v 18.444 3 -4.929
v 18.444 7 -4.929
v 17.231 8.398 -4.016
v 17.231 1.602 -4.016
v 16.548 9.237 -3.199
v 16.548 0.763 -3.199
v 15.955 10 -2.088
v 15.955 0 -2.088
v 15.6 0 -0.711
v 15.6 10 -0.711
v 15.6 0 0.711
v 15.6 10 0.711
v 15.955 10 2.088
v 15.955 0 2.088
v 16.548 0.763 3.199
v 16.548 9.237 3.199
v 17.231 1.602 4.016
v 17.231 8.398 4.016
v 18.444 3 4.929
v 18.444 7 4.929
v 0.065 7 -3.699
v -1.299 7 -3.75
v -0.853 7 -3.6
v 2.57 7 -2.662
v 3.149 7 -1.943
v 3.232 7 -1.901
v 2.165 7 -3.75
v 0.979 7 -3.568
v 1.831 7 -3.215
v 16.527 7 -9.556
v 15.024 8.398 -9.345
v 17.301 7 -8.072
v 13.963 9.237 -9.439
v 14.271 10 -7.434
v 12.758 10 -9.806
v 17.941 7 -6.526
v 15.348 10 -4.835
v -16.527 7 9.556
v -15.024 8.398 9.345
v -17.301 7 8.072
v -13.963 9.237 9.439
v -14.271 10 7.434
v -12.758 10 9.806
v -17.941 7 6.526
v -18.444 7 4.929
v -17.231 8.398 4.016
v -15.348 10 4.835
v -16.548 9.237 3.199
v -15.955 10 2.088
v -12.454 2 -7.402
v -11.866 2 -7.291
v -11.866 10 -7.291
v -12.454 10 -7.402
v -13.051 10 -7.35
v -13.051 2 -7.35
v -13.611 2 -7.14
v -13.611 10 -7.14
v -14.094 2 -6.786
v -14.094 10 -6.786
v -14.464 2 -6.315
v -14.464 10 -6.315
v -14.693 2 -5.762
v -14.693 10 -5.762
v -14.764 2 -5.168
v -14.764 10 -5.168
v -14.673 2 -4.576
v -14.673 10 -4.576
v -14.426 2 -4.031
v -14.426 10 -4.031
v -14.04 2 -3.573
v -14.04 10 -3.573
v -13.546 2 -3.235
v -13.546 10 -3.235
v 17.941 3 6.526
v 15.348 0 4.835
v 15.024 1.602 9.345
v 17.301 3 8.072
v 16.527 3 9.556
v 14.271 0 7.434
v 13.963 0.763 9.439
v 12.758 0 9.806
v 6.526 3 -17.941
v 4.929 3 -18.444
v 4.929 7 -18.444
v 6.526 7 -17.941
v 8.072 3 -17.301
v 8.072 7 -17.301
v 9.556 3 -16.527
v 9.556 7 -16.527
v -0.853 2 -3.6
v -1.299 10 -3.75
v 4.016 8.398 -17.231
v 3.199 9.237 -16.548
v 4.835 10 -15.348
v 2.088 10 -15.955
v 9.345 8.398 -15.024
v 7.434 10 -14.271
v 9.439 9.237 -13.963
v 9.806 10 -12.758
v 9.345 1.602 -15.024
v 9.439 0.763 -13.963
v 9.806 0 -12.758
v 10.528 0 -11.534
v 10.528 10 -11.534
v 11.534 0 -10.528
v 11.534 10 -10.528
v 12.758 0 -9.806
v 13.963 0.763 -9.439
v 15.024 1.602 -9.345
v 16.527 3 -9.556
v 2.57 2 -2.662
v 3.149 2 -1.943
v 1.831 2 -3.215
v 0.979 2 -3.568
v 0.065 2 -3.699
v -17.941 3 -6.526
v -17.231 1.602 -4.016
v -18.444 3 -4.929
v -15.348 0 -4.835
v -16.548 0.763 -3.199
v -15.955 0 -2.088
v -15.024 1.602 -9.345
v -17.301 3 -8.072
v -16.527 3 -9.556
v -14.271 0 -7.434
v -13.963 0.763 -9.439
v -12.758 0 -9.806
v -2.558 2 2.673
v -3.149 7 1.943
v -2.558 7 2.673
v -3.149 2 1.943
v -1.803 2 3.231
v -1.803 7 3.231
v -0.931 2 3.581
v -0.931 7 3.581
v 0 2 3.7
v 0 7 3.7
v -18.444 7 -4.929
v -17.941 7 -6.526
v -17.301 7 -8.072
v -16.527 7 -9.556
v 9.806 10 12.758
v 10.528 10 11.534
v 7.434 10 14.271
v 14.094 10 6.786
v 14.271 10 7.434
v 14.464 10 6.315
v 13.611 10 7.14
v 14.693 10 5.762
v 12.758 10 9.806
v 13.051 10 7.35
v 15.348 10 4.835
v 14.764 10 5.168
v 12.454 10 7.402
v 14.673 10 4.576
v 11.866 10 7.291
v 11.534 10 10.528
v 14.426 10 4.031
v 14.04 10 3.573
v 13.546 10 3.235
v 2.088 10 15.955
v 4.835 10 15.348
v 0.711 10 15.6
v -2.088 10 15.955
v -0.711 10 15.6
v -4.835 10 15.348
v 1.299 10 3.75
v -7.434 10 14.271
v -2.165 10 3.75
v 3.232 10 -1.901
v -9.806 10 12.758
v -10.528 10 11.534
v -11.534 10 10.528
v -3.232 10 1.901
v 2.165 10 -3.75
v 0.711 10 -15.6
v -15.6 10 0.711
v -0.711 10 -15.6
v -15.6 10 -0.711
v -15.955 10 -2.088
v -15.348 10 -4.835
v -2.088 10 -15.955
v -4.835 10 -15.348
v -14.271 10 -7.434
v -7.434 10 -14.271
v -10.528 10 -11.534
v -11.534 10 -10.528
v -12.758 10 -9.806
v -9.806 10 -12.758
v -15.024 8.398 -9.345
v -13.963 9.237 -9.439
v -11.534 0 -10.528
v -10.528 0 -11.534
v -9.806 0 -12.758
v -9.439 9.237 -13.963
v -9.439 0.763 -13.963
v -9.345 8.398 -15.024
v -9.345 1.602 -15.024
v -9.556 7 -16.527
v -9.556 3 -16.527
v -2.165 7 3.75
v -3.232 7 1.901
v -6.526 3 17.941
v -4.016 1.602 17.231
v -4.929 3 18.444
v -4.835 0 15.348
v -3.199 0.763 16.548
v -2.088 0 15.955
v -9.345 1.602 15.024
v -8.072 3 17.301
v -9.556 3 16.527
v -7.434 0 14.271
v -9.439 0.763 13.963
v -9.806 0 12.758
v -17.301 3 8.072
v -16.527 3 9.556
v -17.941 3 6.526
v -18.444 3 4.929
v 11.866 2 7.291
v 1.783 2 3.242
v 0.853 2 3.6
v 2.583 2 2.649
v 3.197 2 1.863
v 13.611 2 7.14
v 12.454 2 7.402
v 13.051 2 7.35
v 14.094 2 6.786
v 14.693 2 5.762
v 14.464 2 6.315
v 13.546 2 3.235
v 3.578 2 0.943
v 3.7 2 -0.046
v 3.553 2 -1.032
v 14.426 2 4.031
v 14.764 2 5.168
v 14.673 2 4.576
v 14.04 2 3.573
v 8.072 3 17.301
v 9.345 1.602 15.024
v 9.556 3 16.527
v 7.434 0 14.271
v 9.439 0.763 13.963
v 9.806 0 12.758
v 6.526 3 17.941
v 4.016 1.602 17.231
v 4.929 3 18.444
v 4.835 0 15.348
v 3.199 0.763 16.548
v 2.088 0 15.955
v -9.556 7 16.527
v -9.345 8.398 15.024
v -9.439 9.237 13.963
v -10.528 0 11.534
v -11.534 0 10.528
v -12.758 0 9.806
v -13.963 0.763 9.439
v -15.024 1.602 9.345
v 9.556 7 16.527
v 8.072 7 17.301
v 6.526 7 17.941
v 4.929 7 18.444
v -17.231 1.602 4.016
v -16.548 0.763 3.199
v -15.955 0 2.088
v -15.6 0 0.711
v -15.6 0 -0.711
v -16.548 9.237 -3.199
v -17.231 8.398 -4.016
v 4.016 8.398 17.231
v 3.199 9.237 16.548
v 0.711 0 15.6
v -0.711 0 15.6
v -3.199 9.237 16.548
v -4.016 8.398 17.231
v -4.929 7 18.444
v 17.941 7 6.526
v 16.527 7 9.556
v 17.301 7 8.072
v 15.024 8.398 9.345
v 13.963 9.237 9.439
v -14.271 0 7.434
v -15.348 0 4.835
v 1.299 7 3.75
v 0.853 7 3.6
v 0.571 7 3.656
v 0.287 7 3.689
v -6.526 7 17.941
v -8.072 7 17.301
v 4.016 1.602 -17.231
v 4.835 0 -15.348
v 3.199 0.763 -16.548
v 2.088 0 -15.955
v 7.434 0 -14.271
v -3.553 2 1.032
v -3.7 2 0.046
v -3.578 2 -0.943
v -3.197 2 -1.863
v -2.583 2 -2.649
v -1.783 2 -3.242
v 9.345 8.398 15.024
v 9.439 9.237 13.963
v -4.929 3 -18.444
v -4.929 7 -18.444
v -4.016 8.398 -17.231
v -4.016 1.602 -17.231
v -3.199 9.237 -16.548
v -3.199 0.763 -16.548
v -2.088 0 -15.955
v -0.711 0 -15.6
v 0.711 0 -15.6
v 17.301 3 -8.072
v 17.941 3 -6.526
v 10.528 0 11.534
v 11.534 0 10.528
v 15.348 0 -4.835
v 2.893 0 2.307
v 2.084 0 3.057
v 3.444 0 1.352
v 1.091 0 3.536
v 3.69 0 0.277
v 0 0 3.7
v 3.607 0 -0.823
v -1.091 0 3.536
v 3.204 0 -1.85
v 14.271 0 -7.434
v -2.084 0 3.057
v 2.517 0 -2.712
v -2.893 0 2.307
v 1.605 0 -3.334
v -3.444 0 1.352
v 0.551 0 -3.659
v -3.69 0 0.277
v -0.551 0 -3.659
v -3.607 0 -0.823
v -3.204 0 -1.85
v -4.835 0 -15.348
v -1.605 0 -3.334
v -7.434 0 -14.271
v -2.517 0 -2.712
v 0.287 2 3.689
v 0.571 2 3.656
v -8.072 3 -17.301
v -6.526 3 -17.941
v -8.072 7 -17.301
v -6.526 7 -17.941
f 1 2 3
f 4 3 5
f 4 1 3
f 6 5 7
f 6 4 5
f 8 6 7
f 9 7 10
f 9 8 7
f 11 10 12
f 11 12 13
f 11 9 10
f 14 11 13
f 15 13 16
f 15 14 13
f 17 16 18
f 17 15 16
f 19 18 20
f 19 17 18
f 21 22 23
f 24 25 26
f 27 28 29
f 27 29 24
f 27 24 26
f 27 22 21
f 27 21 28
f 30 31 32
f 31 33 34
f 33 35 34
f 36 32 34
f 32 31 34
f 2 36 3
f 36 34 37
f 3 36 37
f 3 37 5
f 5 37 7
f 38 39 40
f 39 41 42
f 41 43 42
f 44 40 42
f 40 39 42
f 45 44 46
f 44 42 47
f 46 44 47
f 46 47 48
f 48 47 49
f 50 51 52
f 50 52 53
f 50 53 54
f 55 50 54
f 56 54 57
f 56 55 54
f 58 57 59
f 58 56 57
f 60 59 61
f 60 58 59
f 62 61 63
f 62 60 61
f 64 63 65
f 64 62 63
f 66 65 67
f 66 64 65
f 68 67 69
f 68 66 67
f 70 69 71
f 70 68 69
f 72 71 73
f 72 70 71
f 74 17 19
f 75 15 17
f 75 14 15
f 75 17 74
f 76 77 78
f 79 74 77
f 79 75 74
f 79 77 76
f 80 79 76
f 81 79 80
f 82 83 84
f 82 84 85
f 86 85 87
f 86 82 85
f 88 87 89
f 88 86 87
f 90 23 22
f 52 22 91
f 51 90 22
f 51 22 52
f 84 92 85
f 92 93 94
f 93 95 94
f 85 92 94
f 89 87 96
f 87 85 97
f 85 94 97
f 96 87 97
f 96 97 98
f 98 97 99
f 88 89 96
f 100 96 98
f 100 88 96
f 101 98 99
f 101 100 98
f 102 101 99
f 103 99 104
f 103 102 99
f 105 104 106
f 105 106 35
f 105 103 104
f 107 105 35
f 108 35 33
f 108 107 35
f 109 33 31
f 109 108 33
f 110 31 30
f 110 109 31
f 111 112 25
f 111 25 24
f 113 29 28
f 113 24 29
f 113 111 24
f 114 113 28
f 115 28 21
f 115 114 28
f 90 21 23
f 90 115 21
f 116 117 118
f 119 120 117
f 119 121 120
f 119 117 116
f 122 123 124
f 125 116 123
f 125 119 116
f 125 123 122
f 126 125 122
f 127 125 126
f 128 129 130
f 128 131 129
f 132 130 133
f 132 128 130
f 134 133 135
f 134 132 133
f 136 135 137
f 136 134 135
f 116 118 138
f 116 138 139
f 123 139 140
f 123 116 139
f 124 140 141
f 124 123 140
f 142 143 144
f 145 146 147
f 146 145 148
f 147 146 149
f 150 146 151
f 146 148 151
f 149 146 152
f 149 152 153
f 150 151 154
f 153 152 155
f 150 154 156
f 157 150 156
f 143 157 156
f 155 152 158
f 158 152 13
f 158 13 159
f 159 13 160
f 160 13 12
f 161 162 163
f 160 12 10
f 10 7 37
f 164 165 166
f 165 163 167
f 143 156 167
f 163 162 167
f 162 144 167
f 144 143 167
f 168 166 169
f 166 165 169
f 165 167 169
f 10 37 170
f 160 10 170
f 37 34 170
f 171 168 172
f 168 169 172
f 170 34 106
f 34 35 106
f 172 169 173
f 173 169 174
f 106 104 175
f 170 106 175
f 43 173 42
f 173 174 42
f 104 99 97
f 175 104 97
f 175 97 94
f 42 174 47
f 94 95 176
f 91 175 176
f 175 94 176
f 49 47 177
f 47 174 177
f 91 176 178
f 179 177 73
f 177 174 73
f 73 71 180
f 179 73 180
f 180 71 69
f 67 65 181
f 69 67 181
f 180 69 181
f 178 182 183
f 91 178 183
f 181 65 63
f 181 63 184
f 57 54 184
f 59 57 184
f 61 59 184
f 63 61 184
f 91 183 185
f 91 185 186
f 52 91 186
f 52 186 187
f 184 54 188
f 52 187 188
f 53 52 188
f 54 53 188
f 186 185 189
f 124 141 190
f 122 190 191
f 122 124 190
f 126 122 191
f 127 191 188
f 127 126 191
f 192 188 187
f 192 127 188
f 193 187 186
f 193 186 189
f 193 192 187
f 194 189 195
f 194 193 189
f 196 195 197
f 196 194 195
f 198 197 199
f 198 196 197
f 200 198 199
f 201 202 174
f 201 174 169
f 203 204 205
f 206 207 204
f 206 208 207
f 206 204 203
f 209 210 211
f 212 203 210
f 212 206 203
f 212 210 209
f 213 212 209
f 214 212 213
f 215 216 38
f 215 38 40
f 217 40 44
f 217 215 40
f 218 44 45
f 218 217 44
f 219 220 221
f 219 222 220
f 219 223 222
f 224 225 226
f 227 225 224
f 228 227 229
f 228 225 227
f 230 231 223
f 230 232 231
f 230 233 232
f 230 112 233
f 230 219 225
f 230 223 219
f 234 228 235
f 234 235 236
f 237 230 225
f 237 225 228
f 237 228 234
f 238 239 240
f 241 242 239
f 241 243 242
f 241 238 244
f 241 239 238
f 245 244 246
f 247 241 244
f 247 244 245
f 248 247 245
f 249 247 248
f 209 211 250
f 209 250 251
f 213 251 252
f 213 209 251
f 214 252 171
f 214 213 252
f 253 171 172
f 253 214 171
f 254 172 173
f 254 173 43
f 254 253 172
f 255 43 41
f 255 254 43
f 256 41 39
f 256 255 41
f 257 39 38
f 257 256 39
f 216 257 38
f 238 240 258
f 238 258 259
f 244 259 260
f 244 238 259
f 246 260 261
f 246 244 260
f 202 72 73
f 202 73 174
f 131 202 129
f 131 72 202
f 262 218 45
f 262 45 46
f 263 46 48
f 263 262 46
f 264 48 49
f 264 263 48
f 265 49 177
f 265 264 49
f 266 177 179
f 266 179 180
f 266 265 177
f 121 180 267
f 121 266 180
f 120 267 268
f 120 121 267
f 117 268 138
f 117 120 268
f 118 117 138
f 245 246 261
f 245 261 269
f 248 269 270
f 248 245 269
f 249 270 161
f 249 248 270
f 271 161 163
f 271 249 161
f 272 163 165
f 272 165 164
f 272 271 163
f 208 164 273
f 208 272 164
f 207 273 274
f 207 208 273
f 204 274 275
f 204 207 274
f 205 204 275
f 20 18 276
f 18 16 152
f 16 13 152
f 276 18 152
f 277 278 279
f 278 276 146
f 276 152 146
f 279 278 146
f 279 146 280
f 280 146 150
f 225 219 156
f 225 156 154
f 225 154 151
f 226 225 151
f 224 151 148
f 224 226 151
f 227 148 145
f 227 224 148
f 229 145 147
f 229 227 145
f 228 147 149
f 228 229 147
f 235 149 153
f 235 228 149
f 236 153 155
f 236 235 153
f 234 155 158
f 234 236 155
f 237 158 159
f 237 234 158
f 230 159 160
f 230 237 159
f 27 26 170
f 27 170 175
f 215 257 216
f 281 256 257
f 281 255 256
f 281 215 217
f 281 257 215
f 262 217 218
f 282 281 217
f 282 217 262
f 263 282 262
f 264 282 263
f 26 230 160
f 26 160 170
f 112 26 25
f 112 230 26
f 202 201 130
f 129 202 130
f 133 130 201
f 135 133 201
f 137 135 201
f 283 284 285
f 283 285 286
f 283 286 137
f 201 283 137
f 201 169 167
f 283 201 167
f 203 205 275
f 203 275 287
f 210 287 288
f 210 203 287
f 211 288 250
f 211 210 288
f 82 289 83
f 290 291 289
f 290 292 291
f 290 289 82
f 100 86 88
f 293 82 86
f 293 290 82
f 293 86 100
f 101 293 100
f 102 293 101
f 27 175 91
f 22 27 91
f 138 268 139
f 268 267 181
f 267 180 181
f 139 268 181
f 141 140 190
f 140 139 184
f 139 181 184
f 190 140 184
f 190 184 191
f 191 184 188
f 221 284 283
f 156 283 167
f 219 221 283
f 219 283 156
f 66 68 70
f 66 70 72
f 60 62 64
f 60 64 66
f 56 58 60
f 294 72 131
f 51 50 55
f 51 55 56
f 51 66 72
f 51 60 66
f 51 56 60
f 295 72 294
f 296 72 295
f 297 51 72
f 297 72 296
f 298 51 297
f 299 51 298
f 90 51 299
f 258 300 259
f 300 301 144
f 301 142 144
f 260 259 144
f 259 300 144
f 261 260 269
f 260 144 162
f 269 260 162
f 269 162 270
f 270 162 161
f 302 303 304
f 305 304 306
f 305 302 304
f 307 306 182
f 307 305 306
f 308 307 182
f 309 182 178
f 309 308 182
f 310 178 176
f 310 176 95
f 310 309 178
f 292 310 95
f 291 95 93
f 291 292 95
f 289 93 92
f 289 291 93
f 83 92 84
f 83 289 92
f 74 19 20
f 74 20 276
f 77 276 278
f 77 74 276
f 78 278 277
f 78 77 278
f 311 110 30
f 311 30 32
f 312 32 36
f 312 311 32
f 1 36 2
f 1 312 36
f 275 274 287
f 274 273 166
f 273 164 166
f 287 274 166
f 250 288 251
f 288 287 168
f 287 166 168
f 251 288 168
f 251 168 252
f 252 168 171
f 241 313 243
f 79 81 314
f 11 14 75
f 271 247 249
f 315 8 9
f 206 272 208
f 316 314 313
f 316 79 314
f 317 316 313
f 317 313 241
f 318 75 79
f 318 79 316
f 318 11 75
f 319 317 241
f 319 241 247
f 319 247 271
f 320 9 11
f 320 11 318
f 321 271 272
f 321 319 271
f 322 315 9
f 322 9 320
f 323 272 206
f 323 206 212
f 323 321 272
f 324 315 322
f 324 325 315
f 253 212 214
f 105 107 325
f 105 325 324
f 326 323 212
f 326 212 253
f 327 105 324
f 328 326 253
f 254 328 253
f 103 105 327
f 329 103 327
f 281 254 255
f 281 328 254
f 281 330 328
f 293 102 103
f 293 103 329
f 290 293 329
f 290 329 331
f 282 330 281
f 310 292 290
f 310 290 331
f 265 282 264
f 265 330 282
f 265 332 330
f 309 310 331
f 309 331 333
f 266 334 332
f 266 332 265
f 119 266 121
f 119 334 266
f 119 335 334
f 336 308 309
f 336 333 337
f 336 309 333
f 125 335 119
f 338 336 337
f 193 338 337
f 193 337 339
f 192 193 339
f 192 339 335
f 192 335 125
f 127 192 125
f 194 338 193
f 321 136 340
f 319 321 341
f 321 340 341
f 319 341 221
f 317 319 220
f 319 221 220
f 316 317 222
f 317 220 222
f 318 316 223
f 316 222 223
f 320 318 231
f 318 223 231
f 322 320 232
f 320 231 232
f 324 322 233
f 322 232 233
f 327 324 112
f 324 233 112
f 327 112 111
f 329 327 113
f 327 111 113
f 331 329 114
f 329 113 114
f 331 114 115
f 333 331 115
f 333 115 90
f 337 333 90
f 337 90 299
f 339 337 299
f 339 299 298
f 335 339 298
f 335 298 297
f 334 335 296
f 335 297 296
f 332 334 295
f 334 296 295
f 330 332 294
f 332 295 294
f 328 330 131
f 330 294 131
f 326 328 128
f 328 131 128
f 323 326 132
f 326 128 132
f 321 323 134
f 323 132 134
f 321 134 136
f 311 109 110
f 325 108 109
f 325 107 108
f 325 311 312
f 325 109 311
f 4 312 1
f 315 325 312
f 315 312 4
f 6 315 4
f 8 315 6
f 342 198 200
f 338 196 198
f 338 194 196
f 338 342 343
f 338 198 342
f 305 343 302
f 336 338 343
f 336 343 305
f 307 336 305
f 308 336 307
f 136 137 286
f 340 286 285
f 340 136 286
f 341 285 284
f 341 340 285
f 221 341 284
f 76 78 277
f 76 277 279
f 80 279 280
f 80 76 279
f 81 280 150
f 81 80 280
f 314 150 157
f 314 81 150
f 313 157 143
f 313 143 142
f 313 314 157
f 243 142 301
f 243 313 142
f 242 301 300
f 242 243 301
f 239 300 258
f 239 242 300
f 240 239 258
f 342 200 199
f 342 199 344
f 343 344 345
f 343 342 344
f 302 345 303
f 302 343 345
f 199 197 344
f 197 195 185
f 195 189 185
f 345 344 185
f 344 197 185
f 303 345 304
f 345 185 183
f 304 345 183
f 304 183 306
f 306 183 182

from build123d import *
from build123d.topology import SkipClean

# Parameters (mm, degrees)
BOSS_EXTRUDE1_DEPTH  = 10
CHAMFER1_SIZE        = 3
M4_CLEARANCE_HOLE1_D = 4.8
CUT_EXTRUDE1_START   = -8
SKETCH4_R            = 3.7
SKETCH4_R_2          = 2.4
CUT_EXTRUDE1_DEPTH   = 8
SKETCH4_3_R          = 3.7
SKETCH4_3_R_2        = 2.4
CUT_EXTRUDE2_DEPTH   = 28.935018749
CUT_EXTRUDE3_DEPTH   = 3


with BuildPart() as part:
    # Sketch1 → Boss-Extrude1 (new body)
    with BuildSketch(Plane(origin=(0, 0, 0), x_dir=(1, 0, 0), z_dir=(0, 1, 0))):
        with BuildLine():
            ThreePointArc((4.929173178, -18.444040543), (0, -15.55551692), (-4.929173178, -18.444040543))
            ThreePointArc((-4.929173178, -18.444040543), (-7.30594069, -17.6381011), (-9.556454361, -16.527357921))
            ThreePointArc((-9.556454361, -16.527357921), (-10.999411499, -10.999411499), (-16.527357921, -9.556454361))
            ThreePointArc((-16.527357921, -9.556454361), (-17.6381011, -7.30594069), (-18.444040543, -4.929173178))
            ThreePointArc((-18.444040543, -4.929173178), (-15.55551692, 0), (-18.444040543, 4.929173178))
            ThreePointArc((-18.444040543, 4.929173178), (-17.6381011, 7.30594069), (-16.527357921, 9.556454361))
            ThreePointArc((-16.527357921, 9.556454361), (-10.999411499, 10.999411499), (-9.556454361, 16.527357921))
            ThreePointArc((-9.556454361, 16.527357921), (-7.30594069, 17.6381011), (-4.929173178, 18.444040543))
            ThreePointArc((-4.929173178, 18.444040543), (0, 15.55551692), (4.929173178, 18.444040543))
            ThreePointArc((4.929173178, 18.444040543), (7.30594069, 17.6381011), (9.556454361, 16.527357921))
            ThreePointArc((9.556454361, 16.527357921), (10.999411499, 10.999411499), (16.527357921, 9.556454361))
            ThreePointArc((16.527357921, 9.556454361), (17.6381011, 7.30594069), (18.444040543, 4.929173178))
            ThreePointArc((18.444040543, 4.929173178), (15.55551692, 0), (18.444040543, -4.929173178))
            ThreePointArc((18.444040543, -4.929173178), (17.6381011, -7.30594069), (16.527357921, -9.556454361))
            ThreePointArc((16.527357921, -9.556454361), (10.999411499, -10.999411499), (9.556454361, -16.527357921))
            ThreePointArc((9.556454361, -16.527357921), (7.30594069, -17.6381011), (4.929173178, -18.444040543))
        make_face()
    extrude(amount=BOSS_EXTRUDE1_DEPTH)

    # Chamfer1
    chamfer1_edges = [part.edges().sort_by_distance(p)[0] for p in [
        (7.30594069, 10, -17.6381011),
        (17.6381011, 0, 7.30594069),
        (7.30594069, 0, 17.6381011),
        (-7.30594069, 0, 17.6381011),
        (-17.6381011, 0, 7.30594069),
        (-17.6381011, 0, -7.30594069),
        (-7.30594069, 0, -17.6381011),
        (-7.30594069, 10, -17.6381011),
        (7.30594069, 0, -17.6381011),
        (17.6381011, 0, -7.30594069),
        (-17.6381011, 10, -7.30594069),
        (-17.6381011, 10, 7.30594069),
        (-7.30594069, 10, 17.6381011),
        (17.6381011, 10, -7.30594069),
        (7.30594069, 10, 17.6381011),
        (17.6381011, 10, 7.30594069),
    ]]
    chamfer(chamfer1_edges, length=CHAMFER1_SIZE)

    # M4 Clearance Hole1 (through all)
    with Locations(Plane(origin=(0, 10, 0), x_dir=(1, 0, 0), z_dir=(0, 1, 0))):
        with Locations((0, 0)):
            Hole(M4_CLEARANCE_HOLE1_D / 2)

    # Sketch4 → Cut-Extrude1 (cut)
    # profile 1 of 4: a face of its own
    with BuildSketch(Plane(origin=(0, 10, 0), x_dir=(1, 0, 0), z_dir=(0, 1, 0)).offset(CUT_EXTRUDE1_START)):
        with BuildLine():
            ThreePointArc((-11.865806229, 7.290510339), (-14.597296614, 6.046398231), (-13.545561348, 3.23522275))
            Line((-13.545561348, 3.23522275), (-3.148841491, -1.94288375))
            ThreePointArc((-3.148841491, -1.94288375), (-3.41835427, 1.4159287), (-0.852740897, 3.600393446))
            Line((-0.852740897, 3.600393446), (-11.865806229, 7.290510339))
        make_face()
    # profile 2 of 4: a face of its own
    with BuildSketch(Plane(origin=(0, 10, 0), x_dir=(1, 0, 0), z_dir=(0, 1, 0)).offset(CUT_EXTRUDE1_START)):
        Circle(SKETCH4_R)
        with Locations(Location((0, 0, 0), (0, 0, 270))):
            Circle(SKETCH4_R_2, mode=Mode.SUBTRACT)
    # profile 3 of 4: a face of its own
    with BuildSketch(Plane(origin=(0, 10, 0), x_dir=(1, 0, 0), z_dir=(0, 1, 0)).offset(CUT_EXTRUDE1_START)):
        with Locations(Location((0, 0, 0), (0, 0, 270))):
            Circle(SKETCH4_R_2)
    # profile 4 of 4: a face of its own
    with BuildSketch(Plane(origin=(0, 10, 0), x_dir=(1, 0, 0), z_dir=(0, 1, 0)).offset(CUT_EXTRUDE1_START)):
        with BuildLine():
            ThreePointArc((3.7, 0), (2.902166546, -2.29508809), (0.852740897, -3.600393446))
            Line((0.852740897, -3.600393446), (11.865806229, -7.290510339))
            ThreePointArc((11.865806229, -7.290510339), (14.597296614, -6.046398231), (13.545561348, -3.23522275))
            Line((13.545561348, -3.23522275), (3.148841491, 1.94288375))
            ThreePointArc((3.148841491, 1.94288375), (3.559544459, 1.009773857), (3.7, 0))
        make_face()
    extrude(amount=CUT_EXTRUDE1_DEPTH, mode=Mode.SUBTRACT)

    # Sketch4<3> → Cut-Extrude2 (cut, through all)
    # profile 1 of 2: a face of its own
    with SkipClean():  # the faces are left unmerged after this step: merging them gives an invalid solid
        with BuildSketch(Plane(origin=(0, 10, 0), x_dir=(1, 0, 0), z_dir=(0, 1, 0))):
            with Locations(Location((0, 0, 0), (0, 0, 270))):
                Circle(SKETCH4_3_R)
            Circle(SKETCH4_3_R_2, mode=Mode.SUBTRACT)
        # profile 2 of 2: a face of its own
        with BuildSketch(Plane(origin=(0, 10, 0), x_dir=(1, 0, 0), z_dir=(0, 1, 0))):
            Circle(SKETCH4_3_R_2)
        extrude(amount=-CUT_EXTRUDE2_DEPTH, mode=Mode.SUBTRACT)

    # Sketch5 → Cut-Extrude3 (cut)
    with SkipClean():  # the faces are left unmerged after this step: merging them gives an invalid solid
        with BuildSketch(Plane(origin=(0, 10, 0), x_dir=(1, 0, 0), z_dir=(0, 1, 0))):
            Polygon((2.165063509, -3.75), (4.330127019, 0), (2.165063509, 3.75), (-2.165063509, 3.75), (-4.330127019, 0), (-2.165063509, -3.75), align=None)
        extrude(amount=-CUT_EXTRUDE3_DEPTH, mode=Mode.SUBTRACT)


solid = part.part
